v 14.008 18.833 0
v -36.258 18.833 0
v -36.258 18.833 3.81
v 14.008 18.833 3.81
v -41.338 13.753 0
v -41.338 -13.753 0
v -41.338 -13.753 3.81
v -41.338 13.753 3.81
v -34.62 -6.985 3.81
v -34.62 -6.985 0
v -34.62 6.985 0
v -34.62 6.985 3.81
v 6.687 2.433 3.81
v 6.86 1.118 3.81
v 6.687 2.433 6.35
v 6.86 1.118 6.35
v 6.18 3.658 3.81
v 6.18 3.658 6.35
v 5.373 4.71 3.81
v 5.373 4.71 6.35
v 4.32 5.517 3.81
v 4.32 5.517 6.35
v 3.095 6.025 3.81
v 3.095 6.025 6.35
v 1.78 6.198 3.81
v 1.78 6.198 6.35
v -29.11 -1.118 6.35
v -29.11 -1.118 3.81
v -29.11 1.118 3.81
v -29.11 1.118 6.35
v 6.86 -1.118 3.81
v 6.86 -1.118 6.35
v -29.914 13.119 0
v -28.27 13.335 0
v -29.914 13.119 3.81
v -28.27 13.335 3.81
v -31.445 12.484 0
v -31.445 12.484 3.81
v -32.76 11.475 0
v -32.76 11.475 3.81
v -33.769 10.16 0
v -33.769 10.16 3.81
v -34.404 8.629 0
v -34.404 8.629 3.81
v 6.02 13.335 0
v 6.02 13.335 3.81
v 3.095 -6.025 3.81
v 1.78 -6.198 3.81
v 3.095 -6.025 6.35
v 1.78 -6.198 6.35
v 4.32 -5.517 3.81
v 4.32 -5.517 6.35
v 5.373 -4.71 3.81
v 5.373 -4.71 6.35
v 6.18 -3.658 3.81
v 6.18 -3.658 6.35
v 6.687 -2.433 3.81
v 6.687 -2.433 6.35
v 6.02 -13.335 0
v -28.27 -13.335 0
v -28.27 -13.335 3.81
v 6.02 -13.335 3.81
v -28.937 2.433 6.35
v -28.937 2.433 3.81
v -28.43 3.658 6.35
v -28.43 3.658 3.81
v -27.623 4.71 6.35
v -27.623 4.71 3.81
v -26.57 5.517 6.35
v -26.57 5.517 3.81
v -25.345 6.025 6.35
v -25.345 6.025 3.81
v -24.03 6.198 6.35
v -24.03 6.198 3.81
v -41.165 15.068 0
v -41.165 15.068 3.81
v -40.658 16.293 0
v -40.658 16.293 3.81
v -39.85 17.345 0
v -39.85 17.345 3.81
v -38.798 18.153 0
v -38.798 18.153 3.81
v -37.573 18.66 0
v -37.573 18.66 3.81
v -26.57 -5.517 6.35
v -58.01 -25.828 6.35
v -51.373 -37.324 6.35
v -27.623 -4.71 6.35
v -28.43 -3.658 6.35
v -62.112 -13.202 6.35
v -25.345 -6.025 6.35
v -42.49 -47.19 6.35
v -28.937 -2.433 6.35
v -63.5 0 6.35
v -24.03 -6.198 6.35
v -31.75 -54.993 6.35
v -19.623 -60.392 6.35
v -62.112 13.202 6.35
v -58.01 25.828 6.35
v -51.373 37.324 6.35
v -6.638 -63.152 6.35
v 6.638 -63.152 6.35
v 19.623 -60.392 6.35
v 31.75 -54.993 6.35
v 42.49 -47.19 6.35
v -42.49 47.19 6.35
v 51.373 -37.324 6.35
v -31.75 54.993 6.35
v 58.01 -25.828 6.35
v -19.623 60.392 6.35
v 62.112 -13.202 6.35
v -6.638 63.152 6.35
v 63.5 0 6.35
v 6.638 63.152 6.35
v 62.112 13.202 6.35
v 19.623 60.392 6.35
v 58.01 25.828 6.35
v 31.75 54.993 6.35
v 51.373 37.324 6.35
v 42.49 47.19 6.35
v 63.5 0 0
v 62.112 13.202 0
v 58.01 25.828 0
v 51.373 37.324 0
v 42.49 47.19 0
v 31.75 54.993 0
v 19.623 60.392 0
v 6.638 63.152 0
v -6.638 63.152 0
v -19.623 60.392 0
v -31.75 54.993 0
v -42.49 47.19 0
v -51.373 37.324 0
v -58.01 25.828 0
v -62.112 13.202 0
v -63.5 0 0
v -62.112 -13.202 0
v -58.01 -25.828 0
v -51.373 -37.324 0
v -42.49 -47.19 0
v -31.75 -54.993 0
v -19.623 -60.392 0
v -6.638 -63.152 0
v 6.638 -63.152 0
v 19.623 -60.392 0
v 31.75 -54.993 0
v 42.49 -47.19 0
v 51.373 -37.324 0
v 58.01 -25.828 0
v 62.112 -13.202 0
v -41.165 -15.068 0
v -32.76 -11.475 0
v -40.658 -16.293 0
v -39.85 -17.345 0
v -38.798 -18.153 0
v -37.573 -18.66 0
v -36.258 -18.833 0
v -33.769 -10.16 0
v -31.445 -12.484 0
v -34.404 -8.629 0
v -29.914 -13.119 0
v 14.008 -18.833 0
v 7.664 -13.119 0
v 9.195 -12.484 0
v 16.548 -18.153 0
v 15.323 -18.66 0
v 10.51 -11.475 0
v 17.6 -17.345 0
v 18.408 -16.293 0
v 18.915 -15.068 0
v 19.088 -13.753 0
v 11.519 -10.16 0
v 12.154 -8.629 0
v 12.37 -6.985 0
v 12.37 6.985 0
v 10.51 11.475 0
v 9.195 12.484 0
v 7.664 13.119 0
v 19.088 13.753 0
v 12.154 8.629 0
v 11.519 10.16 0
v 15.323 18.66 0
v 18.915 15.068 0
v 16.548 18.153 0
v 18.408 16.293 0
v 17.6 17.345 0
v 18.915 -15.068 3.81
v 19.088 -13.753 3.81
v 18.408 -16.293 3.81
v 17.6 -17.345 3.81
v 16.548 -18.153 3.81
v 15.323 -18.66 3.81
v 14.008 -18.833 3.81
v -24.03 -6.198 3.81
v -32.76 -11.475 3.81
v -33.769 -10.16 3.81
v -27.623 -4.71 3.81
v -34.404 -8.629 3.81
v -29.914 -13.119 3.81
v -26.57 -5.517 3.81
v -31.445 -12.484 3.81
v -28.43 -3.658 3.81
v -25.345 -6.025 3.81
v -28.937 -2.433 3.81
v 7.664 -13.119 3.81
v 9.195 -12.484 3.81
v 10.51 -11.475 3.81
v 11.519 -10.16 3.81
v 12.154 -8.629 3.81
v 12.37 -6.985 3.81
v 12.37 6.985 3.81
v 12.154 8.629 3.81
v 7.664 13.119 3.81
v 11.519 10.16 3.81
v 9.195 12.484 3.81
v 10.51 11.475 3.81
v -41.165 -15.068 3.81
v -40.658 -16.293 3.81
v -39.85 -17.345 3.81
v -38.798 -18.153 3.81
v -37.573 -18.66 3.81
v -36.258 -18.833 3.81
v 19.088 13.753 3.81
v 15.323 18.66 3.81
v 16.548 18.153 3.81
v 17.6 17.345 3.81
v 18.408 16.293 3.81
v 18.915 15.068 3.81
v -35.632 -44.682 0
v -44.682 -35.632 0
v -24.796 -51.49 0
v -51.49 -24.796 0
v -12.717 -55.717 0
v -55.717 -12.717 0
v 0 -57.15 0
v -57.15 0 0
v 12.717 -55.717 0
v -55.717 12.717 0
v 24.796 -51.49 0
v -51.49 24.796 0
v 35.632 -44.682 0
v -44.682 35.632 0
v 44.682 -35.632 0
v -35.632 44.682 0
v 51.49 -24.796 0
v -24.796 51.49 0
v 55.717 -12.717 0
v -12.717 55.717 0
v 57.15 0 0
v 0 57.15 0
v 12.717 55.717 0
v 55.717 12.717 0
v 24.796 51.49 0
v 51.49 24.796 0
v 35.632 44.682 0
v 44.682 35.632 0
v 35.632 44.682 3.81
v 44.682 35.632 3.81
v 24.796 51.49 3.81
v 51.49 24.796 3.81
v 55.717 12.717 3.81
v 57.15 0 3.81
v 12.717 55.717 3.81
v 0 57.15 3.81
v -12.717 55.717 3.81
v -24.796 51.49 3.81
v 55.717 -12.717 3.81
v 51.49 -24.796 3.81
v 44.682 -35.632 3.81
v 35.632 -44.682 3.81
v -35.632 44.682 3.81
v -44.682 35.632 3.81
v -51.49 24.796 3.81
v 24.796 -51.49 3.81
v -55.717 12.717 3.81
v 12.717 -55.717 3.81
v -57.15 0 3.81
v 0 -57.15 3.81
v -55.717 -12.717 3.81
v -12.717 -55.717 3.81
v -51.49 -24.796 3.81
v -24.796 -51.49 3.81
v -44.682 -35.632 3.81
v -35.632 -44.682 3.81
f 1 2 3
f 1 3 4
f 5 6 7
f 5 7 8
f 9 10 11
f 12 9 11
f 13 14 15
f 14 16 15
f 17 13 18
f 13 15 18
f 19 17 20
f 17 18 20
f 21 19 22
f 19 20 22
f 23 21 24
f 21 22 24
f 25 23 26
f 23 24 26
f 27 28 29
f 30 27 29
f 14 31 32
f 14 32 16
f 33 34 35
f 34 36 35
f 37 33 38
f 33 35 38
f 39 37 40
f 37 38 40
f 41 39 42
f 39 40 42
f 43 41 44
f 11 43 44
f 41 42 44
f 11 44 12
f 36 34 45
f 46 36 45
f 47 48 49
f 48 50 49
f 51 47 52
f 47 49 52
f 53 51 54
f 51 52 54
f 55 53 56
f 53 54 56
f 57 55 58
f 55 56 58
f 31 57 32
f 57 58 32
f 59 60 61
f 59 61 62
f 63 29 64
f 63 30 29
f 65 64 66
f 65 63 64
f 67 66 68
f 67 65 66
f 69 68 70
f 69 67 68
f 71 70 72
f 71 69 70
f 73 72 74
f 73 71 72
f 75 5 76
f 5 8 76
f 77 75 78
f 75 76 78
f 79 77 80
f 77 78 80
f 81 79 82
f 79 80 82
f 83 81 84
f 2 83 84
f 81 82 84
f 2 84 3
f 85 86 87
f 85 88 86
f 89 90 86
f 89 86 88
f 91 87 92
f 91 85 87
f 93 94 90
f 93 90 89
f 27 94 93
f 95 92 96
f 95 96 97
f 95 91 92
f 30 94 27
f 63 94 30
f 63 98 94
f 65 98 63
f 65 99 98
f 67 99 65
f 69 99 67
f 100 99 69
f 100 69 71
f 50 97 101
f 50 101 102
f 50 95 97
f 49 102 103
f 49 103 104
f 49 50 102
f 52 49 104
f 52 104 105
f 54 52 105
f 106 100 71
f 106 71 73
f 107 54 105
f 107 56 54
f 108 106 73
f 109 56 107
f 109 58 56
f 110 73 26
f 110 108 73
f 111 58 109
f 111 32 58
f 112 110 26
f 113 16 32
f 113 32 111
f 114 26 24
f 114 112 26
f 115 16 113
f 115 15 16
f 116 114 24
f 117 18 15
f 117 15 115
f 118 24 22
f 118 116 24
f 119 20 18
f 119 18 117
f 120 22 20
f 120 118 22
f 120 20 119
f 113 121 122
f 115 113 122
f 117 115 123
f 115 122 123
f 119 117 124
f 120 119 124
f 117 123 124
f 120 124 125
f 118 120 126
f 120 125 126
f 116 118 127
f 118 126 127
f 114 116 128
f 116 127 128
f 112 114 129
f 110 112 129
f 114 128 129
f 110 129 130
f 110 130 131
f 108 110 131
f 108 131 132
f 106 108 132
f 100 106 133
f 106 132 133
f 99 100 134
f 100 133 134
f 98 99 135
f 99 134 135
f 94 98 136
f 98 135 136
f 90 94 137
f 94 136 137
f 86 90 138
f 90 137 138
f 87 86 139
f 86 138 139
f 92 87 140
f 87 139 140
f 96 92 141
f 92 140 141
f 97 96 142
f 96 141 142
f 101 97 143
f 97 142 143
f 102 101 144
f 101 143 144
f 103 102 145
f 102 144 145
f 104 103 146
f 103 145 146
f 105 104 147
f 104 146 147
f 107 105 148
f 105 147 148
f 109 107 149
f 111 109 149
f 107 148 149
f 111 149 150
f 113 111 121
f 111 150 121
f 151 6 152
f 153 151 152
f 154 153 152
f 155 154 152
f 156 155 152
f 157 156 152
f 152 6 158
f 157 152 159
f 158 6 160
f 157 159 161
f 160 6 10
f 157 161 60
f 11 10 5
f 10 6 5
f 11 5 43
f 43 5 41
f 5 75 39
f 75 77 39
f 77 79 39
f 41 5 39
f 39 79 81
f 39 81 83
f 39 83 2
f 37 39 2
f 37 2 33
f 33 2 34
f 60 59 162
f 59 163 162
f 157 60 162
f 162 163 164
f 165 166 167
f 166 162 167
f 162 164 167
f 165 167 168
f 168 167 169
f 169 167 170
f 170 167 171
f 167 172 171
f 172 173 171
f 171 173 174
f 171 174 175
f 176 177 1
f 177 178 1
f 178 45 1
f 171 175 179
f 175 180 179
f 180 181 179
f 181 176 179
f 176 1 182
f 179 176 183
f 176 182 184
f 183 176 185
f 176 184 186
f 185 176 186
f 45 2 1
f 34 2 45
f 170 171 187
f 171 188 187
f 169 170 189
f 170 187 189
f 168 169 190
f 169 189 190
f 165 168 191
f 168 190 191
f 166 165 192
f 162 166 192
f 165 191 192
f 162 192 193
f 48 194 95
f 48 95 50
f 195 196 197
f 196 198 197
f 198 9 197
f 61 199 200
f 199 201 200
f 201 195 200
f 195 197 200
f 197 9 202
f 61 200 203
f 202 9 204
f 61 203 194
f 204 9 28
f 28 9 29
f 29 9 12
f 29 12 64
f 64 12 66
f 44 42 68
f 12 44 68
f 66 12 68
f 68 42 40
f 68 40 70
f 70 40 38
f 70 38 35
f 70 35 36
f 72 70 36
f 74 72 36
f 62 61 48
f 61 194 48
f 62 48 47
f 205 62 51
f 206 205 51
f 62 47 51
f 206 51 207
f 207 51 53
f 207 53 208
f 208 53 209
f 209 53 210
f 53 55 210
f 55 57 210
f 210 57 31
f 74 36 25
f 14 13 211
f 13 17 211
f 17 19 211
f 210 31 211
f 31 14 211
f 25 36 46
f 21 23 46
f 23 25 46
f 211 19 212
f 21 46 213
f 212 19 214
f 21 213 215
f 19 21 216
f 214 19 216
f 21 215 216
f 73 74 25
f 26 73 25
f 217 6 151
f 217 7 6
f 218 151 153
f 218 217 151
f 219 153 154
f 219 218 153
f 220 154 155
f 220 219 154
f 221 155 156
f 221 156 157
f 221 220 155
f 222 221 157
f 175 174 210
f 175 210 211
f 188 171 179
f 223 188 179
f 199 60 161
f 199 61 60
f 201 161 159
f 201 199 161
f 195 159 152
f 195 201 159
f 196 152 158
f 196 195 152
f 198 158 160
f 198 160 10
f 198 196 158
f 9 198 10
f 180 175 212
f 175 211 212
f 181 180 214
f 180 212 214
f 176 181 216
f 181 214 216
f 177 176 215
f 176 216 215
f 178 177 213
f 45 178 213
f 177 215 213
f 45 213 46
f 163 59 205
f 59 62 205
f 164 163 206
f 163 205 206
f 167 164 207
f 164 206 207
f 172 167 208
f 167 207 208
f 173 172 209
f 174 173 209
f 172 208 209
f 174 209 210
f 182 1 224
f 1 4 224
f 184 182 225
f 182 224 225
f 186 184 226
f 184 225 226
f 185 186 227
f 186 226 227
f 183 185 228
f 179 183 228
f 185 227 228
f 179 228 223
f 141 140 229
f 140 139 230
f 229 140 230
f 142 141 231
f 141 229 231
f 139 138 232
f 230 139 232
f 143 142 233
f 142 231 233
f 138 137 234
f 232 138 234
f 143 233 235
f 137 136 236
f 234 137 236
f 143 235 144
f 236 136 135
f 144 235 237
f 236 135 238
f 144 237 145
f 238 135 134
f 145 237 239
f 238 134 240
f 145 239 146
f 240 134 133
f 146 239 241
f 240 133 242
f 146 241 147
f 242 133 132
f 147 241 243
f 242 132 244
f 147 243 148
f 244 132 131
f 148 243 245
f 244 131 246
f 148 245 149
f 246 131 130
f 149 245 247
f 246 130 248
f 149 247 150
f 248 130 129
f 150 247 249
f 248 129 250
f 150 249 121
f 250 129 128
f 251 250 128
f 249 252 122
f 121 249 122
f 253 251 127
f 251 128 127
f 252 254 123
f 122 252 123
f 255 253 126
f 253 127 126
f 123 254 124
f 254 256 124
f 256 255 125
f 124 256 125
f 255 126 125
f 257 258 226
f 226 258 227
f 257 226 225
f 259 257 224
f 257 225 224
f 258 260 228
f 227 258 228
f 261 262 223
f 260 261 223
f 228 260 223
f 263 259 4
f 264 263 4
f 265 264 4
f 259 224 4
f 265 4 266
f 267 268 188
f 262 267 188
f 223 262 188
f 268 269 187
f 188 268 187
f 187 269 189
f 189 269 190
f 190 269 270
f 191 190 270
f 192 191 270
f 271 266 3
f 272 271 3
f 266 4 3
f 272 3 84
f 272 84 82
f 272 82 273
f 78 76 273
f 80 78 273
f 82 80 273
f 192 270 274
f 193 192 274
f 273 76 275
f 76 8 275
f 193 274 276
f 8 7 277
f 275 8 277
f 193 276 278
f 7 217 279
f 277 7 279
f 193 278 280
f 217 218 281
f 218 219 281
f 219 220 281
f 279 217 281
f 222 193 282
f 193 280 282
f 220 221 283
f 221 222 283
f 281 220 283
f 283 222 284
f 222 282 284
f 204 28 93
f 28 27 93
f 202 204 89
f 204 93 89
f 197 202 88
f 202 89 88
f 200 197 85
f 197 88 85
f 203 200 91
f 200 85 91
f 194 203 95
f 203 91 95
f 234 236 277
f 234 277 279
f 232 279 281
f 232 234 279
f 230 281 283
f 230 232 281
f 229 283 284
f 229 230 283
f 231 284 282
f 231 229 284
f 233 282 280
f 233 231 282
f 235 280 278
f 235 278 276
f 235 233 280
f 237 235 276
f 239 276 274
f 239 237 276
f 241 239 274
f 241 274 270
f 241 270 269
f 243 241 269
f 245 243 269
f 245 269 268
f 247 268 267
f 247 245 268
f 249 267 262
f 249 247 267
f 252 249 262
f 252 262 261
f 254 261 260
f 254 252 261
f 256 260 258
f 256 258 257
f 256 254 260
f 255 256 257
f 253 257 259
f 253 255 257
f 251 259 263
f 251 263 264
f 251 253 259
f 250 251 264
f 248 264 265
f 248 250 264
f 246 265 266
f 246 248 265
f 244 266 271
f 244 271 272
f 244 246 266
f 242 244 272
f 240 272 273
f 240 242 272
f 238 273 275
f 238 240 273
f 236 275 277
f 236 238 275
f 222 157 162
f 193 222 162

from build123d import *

# Parameters (mm, degrees)
SKETCH3_R           = 63.5
BOSS_EXTRUDE1_DEPTH = 6.35
SKETCH2_W           = 46.99
SKETCH2_H           = 26.67
CUT_EXTRUDE1_DEPTH  = 3.81
FILLET1_R           = 6.35
SKETCH6_W           = 35.970839212
SKETCH6_H           = 12.396108552
CUT_EXTRUDE2_DEPTH  = 6.35
FILLET2_R           = 5.08
SKETCH3_4_R         = 57.15
SKETCH3_4_W         = 60.426788384
SKETCH3_4_H         = 37.666233726
CUT_EXTRUDE4_DEPTH  = 3.81
FILLET3_R           = 5.08


with BuildPart() as part:
    # Sketch3 → Boss-Extrude1 (new body)
    with BuildSketch(Plane.XY):
        Circle(SKETCH3_R)
    extrude(amount=BOSS_EXTRUDE1_DEPTH)

    # Sketch2 → Cut-Extrude1 (cut)
    with BuildSketch(Plane.XY):
        with Locations((-11.125000102, 0)):
            Rectangle(SKETCH2_W, SKETCH2_H)
    extrude(amount=CUT_EXTRUDE1_DEPTH, mode=Mode.SUBTRACT)

    # Fillet1
    fillet1_edges = [part.edges().sort_by_distance(p)[0] for p in [
        (-34.620000102, 13.335, 1.905),
        (12.369999898, 13.335, 1.905),
        (-34.620000102, -13.335, 1.905),
        (12.369999898, -13.335, 1.905),
    ]]
    fillet(fillet1_edges, radius=FILLET1_R)

    # Sketch6 → Cut-Extrude2 (cut)
    with BuildSketch(Plane.XY):
        with Locations((-11.125000102, 0)):
            Rectangle(SKETCH6_W, SKETCH6_H)
    extrude(amount=CUT_EXTRUDE2_DEPTH, mode=Mode.SUBTRACT)

    # Fillet2
    fillet2_edges = [part.edges().sort_by_distance(p)[0] for p in [
        (-29.110419708, -6.198054276, 5.08),
        (-29.110419708, 6.198054276, 5.08),
        (6.860419504, 6.198054276, 5.08),
        (6.860419504, -6.198054276, 5.08),
    ]]
    fillet(fillet2_edges, radius=FILLET2_R)

    # Sketch3<4> → Cut-Extrude4 (cut)
    with BuildSketch(Plane.XY):
        Circle(SKETCH3_4_R)
        with Locations((-11.125000102, 0)):
            Rectangle(SKETCH3_4_W, SKETCH3_4_H, mode=Mode.SUBTRACT)
    extrude(amount=CUT_EXTRUDE4_DEPTH, mode=Mode.SUBTRACT)

    # Fillet3
    fillet3_edges = [part.edges().sort_by_distance(p)[0] for p in [
        (19.08839409, -18.833116863, 1.905),
        (19.08839409, 18.833116863, 1.905),
        (-41.338394294, -18.833116863, 1.905),
        (-41.338394294, 18.833116863, 1.905),
    ]]
    fillet(fillet3_edges, radius=FILLET3_R)


solid = part.part
